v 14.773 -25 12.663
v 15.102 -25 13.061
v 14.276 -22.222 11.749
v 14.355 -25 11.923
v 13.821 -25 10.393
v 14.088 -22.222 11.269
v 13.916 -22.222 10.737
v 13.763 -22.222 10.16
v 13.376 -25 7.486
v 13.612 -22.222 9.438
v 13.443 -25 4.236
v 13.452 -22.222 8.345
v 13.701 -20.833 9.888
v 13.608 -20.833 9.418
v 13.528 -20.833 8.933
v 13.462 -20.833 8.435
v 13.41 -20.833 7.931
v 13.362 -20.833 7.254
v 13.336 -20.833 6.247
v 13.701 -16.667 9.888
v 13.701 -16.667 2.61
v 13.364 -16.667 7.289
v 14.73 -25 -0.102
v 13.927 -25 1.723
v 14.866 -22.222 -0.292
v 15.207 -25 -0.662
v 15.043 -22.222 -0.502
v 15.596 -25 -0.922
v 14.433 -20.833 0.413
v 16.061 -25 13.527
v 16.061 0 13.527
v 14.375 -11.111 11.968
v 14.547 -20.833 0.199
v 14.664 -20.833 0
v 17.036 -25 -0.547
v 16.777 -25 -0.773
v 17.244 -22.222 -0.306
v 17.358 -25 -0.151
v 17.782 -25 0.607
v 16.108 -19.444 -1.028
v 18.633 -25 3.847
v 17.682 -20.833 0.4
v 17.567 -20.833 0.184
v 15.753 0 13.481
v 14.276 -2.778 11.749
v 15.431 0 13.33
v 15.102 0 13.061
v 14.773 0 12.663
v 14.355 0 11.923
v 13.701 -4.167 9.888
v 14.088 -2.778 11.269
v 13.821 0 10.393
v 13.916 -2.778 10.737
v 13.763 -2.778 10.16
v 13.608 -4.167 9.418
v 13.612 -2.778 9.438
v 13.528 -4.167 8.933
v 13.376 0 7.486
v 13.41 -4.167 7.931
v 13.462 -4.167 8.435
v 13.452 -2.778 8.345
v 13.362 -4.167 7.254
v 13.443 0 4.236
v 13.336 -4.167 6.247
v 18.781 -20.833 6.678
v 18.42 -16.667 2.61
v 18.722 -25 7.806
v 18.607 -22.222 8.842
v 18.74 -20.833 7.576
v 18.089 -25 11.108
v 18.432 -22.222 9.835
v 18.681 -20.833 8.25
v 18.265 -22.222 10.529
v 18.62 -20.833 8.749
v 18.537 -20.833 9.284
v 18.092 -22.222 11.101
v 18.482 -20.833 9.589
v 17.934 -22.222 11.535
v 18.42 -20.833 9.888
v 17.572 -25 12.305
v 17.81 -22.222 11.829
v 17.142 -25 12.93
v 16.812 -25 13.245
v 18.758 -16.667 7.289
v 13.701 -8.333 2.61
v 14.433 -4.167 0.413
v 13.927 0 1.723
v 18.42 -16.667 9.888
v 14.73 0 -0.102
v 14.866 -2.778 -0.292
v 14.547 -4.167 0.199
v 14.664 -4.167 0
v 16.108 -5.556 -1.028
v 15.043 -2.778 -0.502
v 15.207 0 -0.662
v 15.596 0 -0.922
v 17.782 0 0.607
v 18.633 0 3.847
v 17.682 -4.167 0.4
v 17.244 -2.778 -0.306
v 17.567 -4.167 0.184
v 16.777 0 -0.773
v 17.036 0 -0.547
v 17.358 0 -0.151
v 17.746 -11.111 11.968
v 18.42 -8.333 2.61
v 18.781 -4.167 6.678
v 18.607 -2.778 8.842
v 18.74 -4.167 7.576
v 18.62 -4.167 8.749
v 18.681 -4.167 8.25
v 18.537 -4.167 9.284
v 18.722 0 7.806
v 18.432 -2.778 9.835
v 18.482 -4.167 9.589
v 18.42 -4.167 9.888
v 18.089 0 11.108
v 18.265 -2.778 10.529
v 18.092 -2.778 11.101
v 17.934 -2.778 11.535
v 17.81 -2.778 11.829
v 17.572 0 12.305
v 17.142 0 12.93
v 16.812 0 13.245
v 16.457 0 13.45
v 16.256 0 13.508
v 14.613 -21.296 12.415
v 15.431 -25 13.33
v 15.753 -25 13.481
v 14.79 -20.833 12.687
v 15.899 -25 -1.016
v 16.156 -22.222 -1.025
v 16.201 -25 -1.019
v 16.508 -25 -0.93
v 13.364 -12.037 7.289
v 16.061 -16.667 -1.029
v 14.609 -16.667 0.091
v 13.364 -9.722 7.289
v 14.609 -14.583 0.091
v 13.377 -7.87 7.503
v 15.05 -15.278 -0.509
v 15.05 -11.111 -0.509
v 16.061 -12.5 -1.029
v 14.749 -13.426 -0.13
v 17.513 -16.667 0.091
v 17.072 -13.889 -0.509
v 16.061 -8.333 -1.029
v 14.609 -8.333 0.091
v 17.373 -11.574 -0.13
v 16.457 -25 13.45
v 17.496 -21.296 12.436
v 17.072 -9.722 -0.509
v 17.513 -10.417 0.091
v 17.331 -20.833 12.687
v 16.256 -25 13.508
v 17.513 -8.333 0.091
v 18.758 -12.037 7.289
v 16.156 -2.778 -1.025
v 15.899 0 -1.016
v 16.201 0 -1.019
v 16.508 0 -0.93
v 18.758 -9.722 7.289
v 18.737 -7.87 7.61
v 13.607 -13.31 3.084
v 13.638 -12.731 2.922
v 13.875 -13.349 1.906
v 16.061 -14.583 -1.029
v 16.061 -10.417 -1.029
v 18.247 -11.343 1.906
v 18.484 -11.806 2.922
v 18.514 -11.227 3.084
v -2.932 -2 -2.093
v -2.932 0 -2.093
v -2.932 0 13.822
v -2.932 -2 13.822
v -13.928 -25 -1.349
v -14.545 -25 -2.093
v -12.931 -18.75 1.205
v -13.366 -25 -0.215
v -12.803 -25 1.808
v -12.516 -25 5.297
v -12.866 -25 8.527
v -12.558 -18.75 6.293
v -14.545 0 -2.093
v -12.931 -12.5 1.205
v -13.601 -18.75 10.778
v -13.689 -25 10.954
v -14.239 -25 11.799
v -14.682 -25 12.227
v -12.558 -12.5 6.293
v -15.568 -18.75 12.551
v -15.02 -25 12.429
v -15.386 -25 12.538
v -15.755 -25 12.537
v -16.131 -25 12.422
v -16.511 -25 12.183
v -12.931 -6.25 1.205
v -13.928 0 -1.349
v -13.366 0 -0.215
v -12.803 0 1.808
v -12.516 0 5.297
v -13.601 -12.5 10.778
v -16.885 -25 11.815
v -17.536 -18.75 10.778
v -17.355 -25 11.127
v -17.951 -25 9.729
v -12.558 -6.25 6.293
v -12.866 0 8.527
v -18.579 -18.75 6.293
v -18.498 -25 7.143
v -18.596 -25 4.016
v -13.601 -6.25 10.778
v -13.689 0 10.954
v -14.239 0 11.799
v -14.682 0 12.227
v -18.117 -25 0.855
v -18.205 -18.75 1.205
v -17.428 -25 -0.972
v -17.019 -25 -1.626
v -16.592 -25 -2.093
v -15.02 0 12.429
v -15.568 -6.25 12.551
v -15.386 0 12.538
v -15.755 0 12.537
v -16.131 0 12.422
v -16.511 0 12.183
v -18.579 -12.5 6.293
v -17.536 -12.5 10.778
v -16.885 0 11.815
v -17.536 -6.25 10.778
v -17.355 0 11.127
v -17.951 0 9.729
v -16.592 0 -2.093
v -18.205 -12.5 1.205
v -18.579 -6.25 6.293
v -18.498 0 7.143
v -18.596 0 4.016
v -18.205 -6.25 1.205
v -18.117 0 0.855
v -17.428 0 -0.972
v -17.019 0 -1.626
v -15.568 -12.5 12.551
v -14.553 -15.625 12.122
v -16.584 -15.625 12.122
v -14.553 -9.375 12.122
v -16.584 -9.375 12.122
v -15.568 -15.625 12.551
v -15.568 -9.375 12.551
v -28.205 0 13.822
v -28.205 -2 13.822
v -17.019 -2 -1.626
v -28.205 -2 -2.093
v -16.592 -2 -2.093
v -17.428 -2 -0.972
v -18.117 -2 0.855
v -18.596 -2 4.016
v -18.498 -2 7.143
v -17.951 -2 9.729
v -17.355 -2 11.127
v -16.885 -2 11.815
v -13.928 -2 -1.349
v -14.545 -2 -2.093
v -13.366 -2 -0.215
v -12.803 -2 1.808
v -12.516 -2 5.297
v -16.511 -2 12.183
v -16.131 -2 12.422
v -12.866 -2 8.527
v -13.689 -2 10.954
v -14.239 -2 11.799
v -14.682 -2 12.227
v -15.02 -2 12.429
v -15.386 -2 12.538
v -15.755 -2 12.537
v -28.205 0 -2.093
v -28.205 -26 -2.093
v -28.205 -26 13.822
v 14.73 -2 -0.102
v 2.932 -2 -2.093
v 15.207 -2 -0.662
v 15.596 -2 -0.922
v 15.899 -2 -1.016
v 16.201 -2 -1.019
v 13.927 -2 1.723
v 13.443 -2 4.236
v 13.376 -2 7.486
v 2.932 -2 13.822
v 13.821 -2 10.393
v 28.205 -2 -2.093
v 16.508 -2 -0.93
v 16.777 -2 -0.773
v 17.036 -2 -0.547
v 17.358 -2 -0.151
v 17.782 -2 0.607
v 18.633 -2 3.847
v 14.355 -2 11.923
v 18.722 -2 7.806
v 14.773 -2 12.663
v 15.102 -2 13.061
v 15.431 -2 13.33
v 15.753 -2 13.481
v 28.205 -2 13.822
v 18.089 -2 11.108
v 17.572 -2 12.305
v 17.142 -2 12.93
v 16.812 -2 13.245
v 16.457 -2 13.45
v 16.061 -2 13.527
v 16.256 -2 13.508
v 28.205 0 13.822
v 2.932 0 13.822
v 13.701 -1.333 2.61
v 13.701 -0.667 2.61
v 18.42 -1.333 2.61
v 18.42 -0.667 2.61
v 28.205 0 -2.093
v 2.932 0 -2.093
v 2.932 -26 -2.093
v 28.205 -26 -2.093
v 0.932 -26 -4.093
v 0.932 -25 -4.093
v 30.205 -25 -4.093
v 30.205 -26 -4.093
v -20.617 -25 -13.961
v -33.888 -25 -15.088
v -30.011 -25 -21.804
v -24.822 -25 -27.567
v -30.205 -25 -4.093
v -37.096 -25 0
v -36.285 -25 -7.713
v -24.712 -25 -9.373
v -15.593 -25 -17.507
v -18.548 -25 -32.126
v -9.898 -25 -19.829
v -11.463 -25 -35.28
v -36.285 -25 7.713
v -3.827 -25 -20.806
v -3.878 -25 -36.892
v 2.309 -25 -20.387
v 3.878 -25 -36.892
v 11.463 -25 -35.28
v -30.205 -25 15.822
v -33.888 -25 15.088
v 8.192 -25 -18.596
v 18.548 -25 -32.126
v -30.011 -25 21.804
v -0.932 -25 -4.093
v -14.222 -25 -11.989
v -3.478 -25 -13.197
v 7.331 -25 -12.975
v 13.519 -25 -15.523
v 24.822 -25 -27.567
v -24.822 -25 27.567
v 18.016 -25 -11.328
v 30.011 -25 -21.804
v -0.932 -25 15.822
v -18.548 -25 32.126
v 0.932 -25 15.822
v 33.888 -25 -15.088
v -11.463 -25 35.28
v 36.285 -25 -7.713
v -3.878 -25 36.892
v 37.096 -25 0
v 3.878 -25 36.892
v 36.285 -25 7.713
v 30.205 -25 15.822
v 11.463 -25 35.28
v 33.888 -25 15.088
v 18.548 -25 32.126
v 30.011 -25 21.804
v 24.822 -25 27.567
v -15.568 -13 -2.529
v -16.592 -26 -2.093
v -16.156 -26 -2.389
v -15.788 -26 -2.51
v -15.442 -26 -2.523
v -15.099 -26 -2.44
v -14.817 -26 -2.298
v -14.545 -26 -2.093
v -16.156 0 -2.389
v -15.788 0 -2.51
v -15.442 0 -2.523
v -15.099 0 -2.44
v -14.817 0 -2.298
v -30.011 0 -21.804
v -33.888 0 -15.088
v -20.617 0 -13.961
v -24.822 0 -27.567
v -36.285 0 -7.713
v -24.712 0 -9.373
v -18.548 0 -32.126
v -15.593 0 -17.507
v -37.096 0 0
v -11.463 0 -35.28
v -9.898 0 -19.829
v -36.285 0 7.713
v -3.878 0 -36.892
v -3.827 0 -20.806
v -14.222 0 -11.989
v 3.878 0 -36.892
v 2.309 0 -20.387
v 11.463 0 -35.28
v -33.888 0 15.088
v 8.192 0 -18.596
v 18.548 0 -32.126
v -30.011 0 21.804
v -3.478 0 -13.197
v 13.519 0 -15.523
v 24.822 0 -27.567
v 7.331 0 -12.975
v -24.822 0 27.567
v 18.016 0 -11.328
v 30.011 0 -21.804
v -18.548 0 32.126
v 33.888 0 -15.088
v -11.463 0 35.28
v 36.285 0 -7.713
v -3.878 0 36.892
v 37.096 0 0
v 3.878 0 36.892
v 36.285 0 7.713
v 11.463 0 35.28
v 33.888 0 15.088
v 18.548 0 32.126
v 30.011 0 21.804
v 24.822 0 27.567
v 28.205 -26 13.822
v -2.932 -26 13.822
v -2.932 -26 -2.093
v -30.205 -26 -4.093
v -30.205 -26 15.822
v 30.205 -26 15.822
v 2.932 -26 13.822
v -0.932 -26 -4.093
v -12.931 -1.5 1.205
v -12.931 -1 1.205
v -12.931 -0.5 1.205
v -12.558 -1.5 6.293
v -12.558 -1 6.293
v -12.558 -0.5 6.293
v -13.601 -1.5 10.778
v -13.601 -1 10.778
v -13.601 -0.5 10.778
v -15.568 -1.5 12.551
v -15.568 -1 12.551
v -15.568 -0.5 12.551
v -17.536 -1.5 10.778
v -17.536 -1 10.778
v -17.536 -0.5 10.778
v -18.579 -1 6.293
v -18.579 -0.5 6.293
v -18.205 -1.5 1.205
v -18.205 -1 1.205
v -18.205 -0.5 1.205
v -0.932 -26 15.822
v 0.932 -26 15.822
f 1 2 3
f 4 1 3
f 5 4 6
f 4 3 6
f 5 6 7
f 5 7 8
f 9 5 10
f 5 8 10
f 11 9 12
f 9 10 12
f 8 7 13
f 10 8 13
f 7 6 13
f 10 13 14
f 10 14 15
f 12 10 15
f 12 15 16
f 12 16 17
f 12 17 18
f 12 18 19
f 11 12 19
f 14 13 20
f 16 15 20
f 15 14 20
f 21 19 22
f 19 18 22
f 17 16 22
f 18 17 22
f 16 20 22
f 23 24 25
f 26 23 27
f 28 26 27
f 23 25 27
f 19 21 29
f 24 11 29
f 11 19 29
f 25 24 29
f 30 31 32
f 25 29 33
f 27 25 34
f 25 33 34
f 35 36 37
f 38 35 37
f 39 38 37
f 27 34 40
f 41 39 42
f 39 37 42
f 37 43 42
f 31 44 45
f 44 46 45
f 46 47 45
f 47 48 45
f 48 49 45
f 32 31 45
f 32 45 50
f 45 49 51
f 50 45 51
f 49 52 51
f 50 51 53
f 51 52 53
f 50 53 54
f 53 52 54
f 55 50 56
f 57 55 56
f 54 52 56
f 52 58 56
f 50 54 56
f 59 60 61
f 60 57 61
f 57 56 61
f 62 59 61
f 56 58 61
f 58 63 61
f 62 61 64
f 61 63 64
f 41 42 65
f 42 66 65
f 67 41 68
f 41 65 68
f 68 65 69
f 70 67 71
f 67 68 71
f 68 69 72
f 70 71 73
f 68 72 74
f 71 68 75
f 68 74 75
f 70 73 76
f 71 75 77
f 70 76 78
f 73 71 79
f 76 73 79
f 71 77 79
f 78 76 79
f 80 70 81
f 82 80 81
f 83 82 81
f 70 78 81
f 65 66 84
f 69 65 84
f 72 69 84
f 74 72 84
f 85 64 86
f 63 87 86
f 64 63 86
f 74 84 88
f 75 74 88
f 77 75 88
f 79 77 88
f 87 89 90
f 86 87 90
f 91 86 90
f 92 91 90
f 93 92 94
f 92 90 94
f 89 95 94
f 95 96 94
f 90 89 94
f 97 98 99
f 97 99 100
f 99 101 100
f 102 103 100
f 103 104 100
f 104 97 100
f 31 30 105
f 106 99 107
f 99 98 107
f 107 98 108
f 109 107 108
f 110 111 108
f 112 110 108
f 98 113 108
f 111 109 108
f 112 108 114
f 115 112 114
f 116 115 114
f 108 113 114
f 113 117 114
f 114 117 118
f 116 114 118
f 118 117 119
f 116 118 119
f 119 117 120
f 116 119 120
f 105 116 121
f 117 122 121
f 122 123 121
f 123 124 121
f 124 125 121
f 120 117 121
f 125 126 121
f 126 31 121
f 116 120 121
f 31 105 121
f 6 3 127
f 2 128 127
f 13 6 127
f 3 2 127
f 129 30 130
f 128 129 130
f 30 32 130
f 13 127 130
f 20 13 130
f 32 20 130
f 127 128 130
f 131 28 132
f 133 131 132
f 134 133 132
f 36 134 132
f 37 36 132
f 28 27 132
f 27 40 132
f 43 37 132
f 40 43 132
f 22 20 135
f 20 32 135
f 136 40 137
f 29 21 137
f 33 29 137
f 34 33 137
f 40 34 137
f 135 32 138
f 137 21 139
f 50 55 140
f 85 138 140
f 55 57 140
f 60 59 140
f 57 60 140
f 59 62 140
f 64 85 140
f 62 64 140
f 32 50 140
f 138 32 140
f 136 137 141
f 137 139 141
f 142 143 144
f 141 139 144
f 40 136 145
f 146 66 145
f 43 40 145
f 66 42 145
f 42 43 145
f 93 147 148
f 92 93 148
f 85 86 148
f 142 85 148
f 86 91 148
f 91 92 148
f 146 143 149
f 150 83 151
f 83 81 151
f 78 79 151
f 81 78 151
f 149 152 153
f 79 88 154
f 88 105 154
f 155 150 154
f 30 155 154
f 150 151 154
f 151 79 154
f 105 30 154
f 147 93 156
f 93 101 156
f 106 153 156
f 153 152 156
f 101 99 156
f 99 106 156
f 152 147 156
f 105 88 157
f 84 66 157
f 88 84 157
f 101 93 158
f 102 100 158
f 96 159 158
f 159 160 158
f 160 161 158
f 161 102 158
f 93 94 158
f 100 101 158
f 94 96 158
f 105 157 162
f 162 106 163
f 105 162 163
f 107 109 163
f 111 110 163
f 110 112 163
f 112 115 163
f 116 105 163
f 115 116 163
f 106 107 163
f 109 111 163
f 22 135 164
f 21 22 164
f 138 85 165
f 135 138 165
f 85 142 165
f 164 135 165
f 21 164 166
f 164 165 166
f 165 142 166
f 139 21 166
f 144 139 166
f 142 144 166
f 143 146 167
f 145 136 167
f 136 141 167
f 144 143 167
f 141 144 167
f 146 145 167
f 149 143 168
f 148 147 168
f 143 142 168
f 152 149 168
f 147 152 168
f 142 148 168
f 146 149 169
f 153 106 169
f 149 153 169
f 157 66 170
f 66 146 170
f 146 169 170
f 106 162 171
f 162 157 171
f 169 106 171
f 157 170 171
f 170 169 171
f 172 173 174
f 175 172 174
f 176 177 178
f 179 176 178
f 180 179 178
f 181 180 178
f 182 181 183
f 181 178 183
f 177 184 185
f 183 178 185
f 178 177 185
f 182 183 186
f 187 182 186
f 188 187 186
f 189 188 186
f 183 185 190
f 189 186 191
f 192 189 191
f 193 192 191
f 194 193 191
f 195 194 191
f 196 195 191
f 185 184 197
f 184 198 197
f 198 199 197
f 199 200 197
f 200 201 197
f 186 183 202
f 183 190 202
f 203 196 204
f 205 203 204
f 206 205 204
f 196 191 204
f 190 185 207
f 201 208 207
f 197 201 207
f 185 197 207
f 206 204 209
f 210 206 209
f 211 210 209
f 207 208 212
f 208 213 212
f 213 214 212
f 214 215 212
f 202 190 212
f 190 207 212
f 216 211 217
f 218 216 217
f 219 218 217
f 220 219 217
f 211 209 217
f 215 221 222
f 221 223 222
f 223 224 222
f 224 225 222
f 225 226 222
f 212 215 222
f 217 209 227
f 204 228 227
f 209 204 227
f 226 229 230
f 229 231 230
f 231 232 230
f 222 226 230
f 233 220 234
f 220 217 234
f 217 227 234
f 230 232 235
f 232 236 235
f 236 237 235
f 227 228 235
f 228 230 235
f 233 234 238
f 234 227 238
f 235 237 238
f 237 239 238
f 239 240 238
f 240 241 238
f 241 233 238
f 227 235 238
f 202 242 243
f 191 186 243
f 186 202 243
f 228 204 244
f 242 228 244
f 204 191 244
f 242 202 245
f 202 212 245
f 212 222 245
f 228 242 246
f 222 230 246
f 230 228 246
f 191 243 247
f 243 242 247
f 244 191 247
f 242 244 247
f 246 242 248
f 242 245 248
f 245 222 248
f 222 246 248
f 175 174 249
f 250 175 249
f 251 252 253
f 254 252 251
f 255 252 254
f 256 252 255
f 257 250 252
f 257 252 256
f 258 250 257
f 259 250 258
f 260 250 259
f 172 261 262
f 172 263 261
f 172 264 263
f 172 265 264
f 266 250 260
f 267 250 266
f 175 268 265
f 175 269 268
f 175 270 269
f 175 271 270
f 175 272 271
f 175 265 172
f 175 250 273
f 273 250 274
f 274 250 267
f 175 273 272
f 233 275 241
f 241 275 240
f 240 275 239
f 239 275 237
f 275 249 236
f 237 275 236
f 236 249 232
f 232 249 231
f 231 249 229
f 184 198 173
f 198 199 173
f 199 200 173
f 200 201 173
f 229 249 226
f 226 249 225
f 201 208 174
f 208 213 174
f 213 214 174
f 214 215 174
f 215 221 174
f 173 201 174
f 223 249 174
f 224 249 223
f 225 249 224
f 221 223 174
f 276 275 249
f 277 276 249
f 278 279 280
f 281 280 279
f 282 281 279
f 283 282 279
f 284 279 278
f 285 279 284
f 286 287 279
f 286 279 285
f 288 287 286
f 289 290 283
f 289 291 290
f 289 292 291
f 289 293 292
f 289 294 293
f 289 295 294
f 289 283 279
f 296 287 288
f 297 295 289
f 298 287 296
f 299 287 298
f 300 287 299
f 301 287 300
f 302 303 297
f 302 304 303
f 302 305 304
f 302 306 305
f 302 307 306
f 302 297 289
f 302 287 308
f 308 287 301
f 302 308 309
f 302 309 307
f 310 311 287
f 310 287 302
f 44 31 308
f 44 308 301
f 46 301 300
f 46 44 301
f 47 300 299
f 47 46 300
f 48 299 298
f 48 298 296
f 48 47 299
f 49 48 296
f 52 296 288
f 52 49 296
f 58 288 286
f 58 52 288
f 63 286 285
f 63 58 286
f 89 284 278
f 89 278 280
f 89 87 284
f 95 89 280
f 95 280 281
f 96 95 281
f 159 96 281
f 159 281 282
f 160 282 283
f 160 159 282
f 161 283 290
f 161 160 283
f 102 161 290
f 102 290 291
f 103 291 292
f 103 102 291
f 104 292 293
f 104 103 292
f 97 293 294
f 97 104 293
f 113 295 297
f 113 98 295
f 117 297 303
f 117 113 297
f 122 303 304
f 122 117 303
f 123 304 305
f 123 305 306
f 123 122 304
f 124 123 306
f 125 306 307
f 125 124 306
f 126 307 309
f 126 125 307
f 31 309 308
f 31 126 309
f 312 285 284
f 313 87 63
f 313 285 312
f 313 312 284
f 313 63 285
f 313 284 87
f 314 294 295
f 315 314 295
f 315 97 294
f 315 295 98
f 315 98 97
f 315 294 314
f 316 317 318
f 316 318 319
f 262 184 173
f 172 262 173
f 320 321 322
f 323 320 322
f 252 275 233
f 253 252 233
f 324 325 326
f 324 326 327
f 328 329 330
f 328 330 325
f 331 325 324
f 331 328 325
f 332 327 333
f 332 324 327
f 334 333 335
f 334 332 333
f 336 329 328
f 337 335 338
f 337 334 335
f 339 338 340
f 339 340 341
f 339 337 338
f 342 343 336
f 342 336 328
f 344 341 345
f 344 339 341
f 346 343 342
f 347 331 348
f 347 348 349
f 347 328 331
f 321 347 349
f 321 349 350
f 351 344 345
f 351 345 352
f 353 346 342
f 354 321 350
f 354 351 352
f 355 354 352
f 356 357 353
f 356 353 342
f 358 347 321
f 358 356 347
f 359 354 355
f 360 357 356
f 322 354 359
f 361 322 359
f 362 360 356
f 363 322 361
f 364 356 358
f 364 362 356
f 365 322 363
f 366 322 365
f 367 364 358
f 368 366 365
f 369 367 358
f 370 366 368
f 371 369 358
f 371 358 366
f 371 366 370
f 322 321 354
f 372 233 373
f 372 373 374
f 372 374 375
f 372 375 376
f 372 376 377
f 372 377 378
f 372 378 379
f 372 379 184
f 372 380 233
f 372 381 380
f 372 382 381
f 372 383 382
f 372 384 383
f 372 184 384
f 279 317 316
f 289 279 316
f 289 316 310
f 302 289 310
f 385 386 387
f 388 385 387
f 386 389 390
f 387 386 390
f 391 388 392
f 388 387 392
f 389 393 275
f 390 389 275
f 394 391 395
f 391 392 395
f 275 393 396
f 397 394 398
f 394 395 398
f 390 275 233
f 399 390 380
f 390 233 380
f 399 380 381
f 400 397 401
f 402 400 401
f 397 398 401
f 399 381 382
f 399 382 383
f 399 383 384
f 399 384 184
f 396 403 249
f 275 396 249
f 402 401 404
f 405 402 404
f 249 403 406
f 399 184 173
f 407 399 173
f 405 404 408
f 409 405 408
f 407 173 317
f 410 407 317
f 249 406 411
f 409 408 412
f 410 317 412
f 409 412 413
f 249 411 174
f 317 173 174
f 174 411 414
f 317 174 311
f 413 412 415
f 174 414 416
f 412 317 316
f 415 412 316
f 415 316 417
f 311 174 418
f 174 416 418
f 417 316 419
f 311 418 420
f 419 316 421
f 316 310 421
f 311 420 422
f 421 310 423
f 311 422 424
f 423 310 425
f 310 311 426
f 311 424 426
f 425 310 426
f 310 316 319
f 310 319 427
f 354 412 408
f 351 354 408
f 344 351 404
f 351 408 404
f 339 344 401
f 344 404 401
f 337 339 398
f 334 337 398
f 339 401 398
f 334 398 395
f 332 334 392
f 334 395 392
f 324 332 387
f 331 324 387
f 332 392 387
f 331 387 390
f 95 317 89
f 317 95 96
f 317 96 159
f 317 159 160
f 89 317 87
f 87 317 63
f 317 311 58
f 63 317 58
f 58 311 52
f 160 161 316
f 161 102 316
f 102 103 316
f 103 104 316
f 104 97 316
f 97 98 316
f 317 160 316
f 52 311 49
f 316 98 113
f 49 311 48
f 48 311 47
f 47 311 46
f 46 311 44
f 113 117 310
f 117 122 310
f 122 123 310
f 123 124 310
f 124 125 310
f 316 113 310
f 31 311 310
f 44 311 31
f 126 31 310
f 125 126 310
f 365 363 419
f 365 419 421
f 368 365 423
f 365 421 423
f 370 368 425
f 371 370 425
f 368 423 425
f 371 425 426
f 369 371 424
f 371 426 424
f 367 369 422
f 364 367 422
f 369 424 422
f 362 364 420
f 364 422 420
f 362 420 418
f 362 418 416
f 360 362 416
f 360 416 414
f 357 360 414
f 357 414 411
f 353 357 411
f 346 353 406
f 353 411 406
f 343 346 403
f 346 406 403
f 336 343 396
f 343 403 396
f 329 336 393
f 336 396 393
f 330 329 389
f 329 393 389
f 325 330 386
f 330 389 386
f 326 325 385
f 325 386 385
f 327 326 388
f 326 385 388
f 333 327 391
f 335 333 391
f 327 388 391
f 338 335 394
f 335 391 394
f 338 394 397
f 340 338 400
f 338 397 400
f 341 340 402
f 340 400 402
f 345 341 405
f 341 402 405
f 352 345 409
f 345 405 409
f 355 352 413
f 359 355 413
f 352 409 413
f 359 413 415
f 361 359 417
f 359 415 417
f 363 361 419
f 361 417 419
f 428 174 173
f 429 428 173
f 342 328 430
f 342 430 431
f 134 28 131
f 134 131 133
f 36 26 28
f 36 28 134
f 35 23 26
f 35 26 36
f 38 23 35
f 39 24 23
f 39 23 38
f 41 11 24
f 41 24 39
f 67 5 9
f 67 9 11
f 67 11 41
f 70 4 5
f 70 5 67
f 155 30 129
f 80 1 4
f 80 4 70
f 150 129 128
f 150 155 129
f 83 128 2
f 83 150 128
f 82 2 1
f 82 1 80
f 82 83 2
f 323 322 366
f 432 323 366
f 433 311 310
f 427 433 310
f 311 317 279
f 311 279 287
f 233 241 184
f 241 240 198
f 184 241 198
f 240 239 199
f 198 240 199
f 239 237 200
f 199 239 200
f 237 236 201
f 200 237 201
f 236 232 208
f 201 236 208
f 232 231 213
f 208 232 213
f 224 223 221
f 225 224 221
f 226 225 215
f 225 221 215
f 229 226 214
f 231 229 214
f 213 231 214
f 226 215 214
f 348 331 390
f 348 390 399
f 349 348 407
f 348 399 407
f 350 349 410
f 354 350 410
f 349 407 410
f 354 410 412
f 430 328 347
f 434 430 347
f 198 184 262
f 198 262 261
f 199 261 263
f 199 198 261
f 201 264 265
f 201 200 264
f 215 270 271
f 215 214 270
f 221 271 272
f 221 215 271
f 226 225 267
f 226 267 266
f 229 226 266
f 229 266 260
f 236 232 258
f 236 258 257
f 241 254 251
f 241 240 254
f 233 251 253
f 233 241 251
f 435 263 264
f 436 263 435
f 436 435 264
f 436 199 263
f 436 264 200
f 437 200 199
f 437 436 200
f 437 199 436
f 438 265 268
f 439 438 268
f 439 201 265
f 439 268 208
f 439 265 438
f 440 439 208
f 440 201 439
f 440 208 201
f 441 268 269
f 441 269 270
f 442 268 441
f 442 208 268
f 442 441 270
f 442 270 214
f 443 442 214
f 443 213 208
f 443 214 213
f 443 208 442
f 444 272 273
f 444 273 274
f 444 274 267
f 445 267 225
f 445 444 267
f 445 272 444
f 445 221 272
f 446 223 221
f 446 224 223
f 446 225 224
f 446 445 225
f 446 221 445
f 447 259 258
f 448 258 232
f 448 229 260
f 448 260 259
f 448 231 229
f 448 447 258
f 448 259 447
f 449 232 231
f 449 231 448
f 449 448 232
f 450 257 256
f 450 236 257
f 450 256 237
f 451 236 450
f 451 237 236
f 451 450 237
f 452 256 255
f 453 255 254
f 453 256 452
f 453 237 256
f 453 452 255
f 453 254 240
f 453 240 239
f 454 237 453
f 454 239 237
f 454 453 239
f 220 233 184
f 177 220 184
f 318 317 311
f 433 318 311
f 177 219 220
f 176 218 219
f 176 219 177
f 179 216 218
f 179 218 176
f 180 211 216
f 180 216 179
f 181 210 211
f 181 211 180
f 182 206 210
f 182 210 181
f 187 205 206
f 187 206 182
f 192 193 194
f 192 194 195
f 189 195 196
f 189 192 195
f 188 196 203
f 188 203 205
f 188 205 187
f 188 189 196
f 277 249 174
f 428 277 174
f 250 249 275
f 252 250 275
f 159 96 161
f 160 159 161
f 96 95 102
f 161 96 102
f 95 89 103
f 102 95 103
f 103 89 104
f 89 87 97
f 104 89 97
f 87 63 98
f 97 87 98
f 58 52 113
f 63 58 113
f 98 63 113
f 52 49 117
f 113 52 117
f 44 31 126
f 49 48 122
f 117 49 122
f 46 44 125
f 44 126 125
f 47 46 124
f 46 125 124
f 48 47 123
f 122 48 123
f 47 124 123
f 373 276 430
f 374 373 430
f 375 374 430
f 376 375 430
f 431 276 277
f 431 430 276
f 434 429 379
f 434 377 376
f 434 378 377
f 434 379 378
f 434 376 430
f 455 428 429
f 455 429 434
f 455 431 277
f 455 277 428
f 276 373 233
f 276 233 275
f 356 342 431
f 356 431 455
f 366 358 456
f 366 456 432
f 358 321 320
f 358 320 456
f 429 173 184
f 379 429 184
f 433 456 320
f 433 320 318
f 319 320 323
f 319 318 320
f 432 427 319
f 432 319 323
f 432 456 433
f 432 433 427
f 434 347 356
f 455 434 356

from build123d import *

# Parameters (mm, degrees)
F0_R     = 37.0955013876
F0_W     = 29.2723282687
F0_H     = 19.9155462906
F1_DEPTH = 25
F0_W_2   = 25.2723282687
F0_H_2   = 15.9155462906
F2_DEPTH = 26
F3_DEPTH = 25
F4_DEPTH = 2


with BuildPart() as f1:
    # F0 (on Front) → F1 (new body)
    with BuildSketch(Plane.XZ):
        Circle(F0_R)
        with BuildLine():
            ThreePointArc((18.0157609284, -11.3276327029), (-3.8265162981, -20.8055450269), (-24.7120950371, -9.3727633357))
            ThreePointArc((-24.7120950371, -9.3727633357), (-3.4784284845, -13.1973405033), (18.0157609284, -11.3276327029))
        make_face(mode=Mode.SUBTRACT)
        with Locations((-15.5684681851, 5.8646076359)):
            Rectangle(F0_W, F0_H, mode=Mode.SUBTRACT)
        with Locations((15.5684681851, 5.8646076359)):
            Rectangle(F0_W, F0_H, mode=Mode.SUBTRACT)
    extrude(amount=F1_DEPTH)

    # F0 (on Front) → F2 (join)
    with BuildSketch(Plane.XZ):
        with Locations((-15.5684681851, 5.8646076359)):
            Rectangle(F0_W, F0_H)
        with BuildLine():
            Line((-28.2046323195, -2.0931655094), (-28.2046323195, 13.8223807812))
            Line((-28.2046323195, 13.8223807812), (-2.9323040508, 13.8223807812))
            Line((-2.9323040508, 13.8223807812), (-2.9323040508, -2.0931655094))
            Line((-2.9323040508, -2.0931655094), (-14.5445793157, -2.0931655094))
            add(Edge.make_bspline(
                [(-16.5923570545, -2.0931655094), (-15.5684681851, -2.9923882857), (-14.5445793157, -2.0931655094)],
                knots=[2.7997772501, 2.7997772501, 2.7997772501, 3.4834080571, 3.4834080571, 3.4834080571], degree=2, weights=[1, 0.9421476987, 1]))
            Line((-16.5923570545, -2.0931655094), (-28.2046323195, -2.0931655094))
        make_face(mode=Mode.SUBTRACT)
        with Locations((15.5684681851, 5.8646076359)):
            Rectangle(F0_W, F0_H)
        with Locations((15.5684681851, 5.8646076359)):
            Rectangle(F0_W_2, F0_H_2, mode=Mode.SUBTRACT)
    extrude(amount=F2_DEPTH)


with BuildPart() as f3:
    # F0 (on Front) → F3 (new body)
    with BuildSketch(Plane.XZ):
        with BuildLine():
            add(Edge.make_bspline(
                [(-15.5684681851, 12.5510344729), (-18.1410138958, 12.5510344729), (-18.5785444858, 6.2932406351), (-19.0160750757, 0.0354467973), (-16.5923570545, -2.0931655094)],
                knots=[0, 0, 0, 1.3998886251, 1.3998886251, 2.7997772501, 2.7997772501, 2.7997772501], degree=2, weights=[1, 0.764878061, 1, 0.764878061, 1]))
            Line((-16.5923570545, -2.0931655094), (-14.5445793157, -2.0931655094))
            add(Edge.make_bspline(
                [(-14.5445793157, -2.0931655094), (-12.1208612946, 0.0354467973), (-12.5583918845, 6.2932406351), (-12.9959224745, 12.5510344729), (-15.5684681851, 12.5510344729)],
                knots=[3.4834080571, 3.4834080571, 3.4834080571, 4.8832966821, 4.8832966821, 6.2831853072, 6.2831853072, 6.2831853072], degree=2, weights=[1, 0.764878061, 1, 0.764878061, 1]))
        make_face()
    extrude(amount=F3_DEPTH)


with BuildPart() as f3b:
    # F0 (on Front) → F3, piece 2 (new body)
    with BuildSketch(Plane.XZ):
        with BuildLine():
            add(Edge.make_bspline(
                [(16.0608887672, 13.5271316394), (11.3416859634, 13.5271316394), (13.7012873653, 2.6101054172), (16.0608887672, -8.306920805), (18.4204901692, 2.6101054172), (20.7800915711, 13.5271316394), (16.0608887672, 13.5271316394)],
                knots=[0, 0, 0, 2.0943951024, 2.0943951024, 4.1887902048, 4.1887902048, 6.2831853072, 6.2831853072, 6.2831853072], degree=2, weights=[1, 0.5, 1, 0.5, 1, 0.5, 1]))
        make_face()
    extrude(amount=F3_DEPTH)


with BuildPart() as f4:
    # F0 (on Front) → F4 (new body)
    with BuildSketch(Plane.XZ):
        with Locations((15.5684681851, 5.8646076359)):
            Rectangle(F0_W_2, F0_H_2)
        with BuildLine():
            add(Edge.make_bspline(
                [(16.0608887672, 13.5271316394), (11.3416859634, 13.5271316394), (13.7012873653, 2.6101054172), (16.0608887672, -8.306920805), (18.4204901692, 2.6101054172), (20.7800915711, 13.5271316394), (16.0608887672, 13.5271316394)],
                knots=[0, 0, 0, 2.0943951024, 2.0943951024, 4.1887902048, 4.1887902048, 6.2831853072, 6.2831853072, 6.2831853072], degree=2, weights=[1, 0.5, 1, 0.5, 1, 0.5, 1]))
        make_face(mode=Mode.SUBTRACT)
    extrude(amount=F4_DEPTH)


with BuildPart() as f4b:
    # F0 (on Front) → F4, piece 2 (new body)
    with BuildSketch(Plane.XZ):
        with BuildLine():
            Line((-2.9323040508, 13.8223807812), (-28.2046323195, 13.8223807812))
            Line((-28.2046323195, 13.8223807812), (-28.2046323195, -2.0931655094))
            Line((-28.2046323195, -2.0931655094), (-16.5923570545, -2.0931655094))
            add(Edge.make_bspline(
                [(-15.5684681851, 12.5510344729), (-18.1410138958, 12.5510344729), (-18.5785444858, 6.2932406351), (-19.0160750757, 0.0354467973), (-16.5923570545, -2.0931655094)],
                knots=[0, 0, 0, 1.3998886251, 1.3998886251, 2.7997772501, 2.7997772501, 2.7997772501], degree=2, weights=[1, 0.764878061, 1, 0.764878061, 1]))
            add(Edge.make_bspline(
                [(-14.5445793157, -2.0931655094), (-12.1208612946, 0.0354467973), (-12.5583918845, 6.2932406351), (-12.9959224745, 12.5510344729), (-15.5684681851, 12.5510344729)],
                knots=[3.4834080571, 3.4834080571, 3.4834080571, 4.8832966821, 4.8832966821, 6.2831853072, 6.2831853072, 6.2831853072], degree=2, weights=[1, 0.764878061, 1, 0.764878061, 1]))
            Line((-14.5445793157, -2.0931655094), (-2.9323040508, -2.0931655094))
            Line((-2.9323040508, -2.0931655094), (-2.9323040508, 13.8223807812))
        make_face()
    extrude(amount=F4_DEPTH)


solid = Compound([f1.part, f3.part, f3b.part, f4.part, f4b.part])
